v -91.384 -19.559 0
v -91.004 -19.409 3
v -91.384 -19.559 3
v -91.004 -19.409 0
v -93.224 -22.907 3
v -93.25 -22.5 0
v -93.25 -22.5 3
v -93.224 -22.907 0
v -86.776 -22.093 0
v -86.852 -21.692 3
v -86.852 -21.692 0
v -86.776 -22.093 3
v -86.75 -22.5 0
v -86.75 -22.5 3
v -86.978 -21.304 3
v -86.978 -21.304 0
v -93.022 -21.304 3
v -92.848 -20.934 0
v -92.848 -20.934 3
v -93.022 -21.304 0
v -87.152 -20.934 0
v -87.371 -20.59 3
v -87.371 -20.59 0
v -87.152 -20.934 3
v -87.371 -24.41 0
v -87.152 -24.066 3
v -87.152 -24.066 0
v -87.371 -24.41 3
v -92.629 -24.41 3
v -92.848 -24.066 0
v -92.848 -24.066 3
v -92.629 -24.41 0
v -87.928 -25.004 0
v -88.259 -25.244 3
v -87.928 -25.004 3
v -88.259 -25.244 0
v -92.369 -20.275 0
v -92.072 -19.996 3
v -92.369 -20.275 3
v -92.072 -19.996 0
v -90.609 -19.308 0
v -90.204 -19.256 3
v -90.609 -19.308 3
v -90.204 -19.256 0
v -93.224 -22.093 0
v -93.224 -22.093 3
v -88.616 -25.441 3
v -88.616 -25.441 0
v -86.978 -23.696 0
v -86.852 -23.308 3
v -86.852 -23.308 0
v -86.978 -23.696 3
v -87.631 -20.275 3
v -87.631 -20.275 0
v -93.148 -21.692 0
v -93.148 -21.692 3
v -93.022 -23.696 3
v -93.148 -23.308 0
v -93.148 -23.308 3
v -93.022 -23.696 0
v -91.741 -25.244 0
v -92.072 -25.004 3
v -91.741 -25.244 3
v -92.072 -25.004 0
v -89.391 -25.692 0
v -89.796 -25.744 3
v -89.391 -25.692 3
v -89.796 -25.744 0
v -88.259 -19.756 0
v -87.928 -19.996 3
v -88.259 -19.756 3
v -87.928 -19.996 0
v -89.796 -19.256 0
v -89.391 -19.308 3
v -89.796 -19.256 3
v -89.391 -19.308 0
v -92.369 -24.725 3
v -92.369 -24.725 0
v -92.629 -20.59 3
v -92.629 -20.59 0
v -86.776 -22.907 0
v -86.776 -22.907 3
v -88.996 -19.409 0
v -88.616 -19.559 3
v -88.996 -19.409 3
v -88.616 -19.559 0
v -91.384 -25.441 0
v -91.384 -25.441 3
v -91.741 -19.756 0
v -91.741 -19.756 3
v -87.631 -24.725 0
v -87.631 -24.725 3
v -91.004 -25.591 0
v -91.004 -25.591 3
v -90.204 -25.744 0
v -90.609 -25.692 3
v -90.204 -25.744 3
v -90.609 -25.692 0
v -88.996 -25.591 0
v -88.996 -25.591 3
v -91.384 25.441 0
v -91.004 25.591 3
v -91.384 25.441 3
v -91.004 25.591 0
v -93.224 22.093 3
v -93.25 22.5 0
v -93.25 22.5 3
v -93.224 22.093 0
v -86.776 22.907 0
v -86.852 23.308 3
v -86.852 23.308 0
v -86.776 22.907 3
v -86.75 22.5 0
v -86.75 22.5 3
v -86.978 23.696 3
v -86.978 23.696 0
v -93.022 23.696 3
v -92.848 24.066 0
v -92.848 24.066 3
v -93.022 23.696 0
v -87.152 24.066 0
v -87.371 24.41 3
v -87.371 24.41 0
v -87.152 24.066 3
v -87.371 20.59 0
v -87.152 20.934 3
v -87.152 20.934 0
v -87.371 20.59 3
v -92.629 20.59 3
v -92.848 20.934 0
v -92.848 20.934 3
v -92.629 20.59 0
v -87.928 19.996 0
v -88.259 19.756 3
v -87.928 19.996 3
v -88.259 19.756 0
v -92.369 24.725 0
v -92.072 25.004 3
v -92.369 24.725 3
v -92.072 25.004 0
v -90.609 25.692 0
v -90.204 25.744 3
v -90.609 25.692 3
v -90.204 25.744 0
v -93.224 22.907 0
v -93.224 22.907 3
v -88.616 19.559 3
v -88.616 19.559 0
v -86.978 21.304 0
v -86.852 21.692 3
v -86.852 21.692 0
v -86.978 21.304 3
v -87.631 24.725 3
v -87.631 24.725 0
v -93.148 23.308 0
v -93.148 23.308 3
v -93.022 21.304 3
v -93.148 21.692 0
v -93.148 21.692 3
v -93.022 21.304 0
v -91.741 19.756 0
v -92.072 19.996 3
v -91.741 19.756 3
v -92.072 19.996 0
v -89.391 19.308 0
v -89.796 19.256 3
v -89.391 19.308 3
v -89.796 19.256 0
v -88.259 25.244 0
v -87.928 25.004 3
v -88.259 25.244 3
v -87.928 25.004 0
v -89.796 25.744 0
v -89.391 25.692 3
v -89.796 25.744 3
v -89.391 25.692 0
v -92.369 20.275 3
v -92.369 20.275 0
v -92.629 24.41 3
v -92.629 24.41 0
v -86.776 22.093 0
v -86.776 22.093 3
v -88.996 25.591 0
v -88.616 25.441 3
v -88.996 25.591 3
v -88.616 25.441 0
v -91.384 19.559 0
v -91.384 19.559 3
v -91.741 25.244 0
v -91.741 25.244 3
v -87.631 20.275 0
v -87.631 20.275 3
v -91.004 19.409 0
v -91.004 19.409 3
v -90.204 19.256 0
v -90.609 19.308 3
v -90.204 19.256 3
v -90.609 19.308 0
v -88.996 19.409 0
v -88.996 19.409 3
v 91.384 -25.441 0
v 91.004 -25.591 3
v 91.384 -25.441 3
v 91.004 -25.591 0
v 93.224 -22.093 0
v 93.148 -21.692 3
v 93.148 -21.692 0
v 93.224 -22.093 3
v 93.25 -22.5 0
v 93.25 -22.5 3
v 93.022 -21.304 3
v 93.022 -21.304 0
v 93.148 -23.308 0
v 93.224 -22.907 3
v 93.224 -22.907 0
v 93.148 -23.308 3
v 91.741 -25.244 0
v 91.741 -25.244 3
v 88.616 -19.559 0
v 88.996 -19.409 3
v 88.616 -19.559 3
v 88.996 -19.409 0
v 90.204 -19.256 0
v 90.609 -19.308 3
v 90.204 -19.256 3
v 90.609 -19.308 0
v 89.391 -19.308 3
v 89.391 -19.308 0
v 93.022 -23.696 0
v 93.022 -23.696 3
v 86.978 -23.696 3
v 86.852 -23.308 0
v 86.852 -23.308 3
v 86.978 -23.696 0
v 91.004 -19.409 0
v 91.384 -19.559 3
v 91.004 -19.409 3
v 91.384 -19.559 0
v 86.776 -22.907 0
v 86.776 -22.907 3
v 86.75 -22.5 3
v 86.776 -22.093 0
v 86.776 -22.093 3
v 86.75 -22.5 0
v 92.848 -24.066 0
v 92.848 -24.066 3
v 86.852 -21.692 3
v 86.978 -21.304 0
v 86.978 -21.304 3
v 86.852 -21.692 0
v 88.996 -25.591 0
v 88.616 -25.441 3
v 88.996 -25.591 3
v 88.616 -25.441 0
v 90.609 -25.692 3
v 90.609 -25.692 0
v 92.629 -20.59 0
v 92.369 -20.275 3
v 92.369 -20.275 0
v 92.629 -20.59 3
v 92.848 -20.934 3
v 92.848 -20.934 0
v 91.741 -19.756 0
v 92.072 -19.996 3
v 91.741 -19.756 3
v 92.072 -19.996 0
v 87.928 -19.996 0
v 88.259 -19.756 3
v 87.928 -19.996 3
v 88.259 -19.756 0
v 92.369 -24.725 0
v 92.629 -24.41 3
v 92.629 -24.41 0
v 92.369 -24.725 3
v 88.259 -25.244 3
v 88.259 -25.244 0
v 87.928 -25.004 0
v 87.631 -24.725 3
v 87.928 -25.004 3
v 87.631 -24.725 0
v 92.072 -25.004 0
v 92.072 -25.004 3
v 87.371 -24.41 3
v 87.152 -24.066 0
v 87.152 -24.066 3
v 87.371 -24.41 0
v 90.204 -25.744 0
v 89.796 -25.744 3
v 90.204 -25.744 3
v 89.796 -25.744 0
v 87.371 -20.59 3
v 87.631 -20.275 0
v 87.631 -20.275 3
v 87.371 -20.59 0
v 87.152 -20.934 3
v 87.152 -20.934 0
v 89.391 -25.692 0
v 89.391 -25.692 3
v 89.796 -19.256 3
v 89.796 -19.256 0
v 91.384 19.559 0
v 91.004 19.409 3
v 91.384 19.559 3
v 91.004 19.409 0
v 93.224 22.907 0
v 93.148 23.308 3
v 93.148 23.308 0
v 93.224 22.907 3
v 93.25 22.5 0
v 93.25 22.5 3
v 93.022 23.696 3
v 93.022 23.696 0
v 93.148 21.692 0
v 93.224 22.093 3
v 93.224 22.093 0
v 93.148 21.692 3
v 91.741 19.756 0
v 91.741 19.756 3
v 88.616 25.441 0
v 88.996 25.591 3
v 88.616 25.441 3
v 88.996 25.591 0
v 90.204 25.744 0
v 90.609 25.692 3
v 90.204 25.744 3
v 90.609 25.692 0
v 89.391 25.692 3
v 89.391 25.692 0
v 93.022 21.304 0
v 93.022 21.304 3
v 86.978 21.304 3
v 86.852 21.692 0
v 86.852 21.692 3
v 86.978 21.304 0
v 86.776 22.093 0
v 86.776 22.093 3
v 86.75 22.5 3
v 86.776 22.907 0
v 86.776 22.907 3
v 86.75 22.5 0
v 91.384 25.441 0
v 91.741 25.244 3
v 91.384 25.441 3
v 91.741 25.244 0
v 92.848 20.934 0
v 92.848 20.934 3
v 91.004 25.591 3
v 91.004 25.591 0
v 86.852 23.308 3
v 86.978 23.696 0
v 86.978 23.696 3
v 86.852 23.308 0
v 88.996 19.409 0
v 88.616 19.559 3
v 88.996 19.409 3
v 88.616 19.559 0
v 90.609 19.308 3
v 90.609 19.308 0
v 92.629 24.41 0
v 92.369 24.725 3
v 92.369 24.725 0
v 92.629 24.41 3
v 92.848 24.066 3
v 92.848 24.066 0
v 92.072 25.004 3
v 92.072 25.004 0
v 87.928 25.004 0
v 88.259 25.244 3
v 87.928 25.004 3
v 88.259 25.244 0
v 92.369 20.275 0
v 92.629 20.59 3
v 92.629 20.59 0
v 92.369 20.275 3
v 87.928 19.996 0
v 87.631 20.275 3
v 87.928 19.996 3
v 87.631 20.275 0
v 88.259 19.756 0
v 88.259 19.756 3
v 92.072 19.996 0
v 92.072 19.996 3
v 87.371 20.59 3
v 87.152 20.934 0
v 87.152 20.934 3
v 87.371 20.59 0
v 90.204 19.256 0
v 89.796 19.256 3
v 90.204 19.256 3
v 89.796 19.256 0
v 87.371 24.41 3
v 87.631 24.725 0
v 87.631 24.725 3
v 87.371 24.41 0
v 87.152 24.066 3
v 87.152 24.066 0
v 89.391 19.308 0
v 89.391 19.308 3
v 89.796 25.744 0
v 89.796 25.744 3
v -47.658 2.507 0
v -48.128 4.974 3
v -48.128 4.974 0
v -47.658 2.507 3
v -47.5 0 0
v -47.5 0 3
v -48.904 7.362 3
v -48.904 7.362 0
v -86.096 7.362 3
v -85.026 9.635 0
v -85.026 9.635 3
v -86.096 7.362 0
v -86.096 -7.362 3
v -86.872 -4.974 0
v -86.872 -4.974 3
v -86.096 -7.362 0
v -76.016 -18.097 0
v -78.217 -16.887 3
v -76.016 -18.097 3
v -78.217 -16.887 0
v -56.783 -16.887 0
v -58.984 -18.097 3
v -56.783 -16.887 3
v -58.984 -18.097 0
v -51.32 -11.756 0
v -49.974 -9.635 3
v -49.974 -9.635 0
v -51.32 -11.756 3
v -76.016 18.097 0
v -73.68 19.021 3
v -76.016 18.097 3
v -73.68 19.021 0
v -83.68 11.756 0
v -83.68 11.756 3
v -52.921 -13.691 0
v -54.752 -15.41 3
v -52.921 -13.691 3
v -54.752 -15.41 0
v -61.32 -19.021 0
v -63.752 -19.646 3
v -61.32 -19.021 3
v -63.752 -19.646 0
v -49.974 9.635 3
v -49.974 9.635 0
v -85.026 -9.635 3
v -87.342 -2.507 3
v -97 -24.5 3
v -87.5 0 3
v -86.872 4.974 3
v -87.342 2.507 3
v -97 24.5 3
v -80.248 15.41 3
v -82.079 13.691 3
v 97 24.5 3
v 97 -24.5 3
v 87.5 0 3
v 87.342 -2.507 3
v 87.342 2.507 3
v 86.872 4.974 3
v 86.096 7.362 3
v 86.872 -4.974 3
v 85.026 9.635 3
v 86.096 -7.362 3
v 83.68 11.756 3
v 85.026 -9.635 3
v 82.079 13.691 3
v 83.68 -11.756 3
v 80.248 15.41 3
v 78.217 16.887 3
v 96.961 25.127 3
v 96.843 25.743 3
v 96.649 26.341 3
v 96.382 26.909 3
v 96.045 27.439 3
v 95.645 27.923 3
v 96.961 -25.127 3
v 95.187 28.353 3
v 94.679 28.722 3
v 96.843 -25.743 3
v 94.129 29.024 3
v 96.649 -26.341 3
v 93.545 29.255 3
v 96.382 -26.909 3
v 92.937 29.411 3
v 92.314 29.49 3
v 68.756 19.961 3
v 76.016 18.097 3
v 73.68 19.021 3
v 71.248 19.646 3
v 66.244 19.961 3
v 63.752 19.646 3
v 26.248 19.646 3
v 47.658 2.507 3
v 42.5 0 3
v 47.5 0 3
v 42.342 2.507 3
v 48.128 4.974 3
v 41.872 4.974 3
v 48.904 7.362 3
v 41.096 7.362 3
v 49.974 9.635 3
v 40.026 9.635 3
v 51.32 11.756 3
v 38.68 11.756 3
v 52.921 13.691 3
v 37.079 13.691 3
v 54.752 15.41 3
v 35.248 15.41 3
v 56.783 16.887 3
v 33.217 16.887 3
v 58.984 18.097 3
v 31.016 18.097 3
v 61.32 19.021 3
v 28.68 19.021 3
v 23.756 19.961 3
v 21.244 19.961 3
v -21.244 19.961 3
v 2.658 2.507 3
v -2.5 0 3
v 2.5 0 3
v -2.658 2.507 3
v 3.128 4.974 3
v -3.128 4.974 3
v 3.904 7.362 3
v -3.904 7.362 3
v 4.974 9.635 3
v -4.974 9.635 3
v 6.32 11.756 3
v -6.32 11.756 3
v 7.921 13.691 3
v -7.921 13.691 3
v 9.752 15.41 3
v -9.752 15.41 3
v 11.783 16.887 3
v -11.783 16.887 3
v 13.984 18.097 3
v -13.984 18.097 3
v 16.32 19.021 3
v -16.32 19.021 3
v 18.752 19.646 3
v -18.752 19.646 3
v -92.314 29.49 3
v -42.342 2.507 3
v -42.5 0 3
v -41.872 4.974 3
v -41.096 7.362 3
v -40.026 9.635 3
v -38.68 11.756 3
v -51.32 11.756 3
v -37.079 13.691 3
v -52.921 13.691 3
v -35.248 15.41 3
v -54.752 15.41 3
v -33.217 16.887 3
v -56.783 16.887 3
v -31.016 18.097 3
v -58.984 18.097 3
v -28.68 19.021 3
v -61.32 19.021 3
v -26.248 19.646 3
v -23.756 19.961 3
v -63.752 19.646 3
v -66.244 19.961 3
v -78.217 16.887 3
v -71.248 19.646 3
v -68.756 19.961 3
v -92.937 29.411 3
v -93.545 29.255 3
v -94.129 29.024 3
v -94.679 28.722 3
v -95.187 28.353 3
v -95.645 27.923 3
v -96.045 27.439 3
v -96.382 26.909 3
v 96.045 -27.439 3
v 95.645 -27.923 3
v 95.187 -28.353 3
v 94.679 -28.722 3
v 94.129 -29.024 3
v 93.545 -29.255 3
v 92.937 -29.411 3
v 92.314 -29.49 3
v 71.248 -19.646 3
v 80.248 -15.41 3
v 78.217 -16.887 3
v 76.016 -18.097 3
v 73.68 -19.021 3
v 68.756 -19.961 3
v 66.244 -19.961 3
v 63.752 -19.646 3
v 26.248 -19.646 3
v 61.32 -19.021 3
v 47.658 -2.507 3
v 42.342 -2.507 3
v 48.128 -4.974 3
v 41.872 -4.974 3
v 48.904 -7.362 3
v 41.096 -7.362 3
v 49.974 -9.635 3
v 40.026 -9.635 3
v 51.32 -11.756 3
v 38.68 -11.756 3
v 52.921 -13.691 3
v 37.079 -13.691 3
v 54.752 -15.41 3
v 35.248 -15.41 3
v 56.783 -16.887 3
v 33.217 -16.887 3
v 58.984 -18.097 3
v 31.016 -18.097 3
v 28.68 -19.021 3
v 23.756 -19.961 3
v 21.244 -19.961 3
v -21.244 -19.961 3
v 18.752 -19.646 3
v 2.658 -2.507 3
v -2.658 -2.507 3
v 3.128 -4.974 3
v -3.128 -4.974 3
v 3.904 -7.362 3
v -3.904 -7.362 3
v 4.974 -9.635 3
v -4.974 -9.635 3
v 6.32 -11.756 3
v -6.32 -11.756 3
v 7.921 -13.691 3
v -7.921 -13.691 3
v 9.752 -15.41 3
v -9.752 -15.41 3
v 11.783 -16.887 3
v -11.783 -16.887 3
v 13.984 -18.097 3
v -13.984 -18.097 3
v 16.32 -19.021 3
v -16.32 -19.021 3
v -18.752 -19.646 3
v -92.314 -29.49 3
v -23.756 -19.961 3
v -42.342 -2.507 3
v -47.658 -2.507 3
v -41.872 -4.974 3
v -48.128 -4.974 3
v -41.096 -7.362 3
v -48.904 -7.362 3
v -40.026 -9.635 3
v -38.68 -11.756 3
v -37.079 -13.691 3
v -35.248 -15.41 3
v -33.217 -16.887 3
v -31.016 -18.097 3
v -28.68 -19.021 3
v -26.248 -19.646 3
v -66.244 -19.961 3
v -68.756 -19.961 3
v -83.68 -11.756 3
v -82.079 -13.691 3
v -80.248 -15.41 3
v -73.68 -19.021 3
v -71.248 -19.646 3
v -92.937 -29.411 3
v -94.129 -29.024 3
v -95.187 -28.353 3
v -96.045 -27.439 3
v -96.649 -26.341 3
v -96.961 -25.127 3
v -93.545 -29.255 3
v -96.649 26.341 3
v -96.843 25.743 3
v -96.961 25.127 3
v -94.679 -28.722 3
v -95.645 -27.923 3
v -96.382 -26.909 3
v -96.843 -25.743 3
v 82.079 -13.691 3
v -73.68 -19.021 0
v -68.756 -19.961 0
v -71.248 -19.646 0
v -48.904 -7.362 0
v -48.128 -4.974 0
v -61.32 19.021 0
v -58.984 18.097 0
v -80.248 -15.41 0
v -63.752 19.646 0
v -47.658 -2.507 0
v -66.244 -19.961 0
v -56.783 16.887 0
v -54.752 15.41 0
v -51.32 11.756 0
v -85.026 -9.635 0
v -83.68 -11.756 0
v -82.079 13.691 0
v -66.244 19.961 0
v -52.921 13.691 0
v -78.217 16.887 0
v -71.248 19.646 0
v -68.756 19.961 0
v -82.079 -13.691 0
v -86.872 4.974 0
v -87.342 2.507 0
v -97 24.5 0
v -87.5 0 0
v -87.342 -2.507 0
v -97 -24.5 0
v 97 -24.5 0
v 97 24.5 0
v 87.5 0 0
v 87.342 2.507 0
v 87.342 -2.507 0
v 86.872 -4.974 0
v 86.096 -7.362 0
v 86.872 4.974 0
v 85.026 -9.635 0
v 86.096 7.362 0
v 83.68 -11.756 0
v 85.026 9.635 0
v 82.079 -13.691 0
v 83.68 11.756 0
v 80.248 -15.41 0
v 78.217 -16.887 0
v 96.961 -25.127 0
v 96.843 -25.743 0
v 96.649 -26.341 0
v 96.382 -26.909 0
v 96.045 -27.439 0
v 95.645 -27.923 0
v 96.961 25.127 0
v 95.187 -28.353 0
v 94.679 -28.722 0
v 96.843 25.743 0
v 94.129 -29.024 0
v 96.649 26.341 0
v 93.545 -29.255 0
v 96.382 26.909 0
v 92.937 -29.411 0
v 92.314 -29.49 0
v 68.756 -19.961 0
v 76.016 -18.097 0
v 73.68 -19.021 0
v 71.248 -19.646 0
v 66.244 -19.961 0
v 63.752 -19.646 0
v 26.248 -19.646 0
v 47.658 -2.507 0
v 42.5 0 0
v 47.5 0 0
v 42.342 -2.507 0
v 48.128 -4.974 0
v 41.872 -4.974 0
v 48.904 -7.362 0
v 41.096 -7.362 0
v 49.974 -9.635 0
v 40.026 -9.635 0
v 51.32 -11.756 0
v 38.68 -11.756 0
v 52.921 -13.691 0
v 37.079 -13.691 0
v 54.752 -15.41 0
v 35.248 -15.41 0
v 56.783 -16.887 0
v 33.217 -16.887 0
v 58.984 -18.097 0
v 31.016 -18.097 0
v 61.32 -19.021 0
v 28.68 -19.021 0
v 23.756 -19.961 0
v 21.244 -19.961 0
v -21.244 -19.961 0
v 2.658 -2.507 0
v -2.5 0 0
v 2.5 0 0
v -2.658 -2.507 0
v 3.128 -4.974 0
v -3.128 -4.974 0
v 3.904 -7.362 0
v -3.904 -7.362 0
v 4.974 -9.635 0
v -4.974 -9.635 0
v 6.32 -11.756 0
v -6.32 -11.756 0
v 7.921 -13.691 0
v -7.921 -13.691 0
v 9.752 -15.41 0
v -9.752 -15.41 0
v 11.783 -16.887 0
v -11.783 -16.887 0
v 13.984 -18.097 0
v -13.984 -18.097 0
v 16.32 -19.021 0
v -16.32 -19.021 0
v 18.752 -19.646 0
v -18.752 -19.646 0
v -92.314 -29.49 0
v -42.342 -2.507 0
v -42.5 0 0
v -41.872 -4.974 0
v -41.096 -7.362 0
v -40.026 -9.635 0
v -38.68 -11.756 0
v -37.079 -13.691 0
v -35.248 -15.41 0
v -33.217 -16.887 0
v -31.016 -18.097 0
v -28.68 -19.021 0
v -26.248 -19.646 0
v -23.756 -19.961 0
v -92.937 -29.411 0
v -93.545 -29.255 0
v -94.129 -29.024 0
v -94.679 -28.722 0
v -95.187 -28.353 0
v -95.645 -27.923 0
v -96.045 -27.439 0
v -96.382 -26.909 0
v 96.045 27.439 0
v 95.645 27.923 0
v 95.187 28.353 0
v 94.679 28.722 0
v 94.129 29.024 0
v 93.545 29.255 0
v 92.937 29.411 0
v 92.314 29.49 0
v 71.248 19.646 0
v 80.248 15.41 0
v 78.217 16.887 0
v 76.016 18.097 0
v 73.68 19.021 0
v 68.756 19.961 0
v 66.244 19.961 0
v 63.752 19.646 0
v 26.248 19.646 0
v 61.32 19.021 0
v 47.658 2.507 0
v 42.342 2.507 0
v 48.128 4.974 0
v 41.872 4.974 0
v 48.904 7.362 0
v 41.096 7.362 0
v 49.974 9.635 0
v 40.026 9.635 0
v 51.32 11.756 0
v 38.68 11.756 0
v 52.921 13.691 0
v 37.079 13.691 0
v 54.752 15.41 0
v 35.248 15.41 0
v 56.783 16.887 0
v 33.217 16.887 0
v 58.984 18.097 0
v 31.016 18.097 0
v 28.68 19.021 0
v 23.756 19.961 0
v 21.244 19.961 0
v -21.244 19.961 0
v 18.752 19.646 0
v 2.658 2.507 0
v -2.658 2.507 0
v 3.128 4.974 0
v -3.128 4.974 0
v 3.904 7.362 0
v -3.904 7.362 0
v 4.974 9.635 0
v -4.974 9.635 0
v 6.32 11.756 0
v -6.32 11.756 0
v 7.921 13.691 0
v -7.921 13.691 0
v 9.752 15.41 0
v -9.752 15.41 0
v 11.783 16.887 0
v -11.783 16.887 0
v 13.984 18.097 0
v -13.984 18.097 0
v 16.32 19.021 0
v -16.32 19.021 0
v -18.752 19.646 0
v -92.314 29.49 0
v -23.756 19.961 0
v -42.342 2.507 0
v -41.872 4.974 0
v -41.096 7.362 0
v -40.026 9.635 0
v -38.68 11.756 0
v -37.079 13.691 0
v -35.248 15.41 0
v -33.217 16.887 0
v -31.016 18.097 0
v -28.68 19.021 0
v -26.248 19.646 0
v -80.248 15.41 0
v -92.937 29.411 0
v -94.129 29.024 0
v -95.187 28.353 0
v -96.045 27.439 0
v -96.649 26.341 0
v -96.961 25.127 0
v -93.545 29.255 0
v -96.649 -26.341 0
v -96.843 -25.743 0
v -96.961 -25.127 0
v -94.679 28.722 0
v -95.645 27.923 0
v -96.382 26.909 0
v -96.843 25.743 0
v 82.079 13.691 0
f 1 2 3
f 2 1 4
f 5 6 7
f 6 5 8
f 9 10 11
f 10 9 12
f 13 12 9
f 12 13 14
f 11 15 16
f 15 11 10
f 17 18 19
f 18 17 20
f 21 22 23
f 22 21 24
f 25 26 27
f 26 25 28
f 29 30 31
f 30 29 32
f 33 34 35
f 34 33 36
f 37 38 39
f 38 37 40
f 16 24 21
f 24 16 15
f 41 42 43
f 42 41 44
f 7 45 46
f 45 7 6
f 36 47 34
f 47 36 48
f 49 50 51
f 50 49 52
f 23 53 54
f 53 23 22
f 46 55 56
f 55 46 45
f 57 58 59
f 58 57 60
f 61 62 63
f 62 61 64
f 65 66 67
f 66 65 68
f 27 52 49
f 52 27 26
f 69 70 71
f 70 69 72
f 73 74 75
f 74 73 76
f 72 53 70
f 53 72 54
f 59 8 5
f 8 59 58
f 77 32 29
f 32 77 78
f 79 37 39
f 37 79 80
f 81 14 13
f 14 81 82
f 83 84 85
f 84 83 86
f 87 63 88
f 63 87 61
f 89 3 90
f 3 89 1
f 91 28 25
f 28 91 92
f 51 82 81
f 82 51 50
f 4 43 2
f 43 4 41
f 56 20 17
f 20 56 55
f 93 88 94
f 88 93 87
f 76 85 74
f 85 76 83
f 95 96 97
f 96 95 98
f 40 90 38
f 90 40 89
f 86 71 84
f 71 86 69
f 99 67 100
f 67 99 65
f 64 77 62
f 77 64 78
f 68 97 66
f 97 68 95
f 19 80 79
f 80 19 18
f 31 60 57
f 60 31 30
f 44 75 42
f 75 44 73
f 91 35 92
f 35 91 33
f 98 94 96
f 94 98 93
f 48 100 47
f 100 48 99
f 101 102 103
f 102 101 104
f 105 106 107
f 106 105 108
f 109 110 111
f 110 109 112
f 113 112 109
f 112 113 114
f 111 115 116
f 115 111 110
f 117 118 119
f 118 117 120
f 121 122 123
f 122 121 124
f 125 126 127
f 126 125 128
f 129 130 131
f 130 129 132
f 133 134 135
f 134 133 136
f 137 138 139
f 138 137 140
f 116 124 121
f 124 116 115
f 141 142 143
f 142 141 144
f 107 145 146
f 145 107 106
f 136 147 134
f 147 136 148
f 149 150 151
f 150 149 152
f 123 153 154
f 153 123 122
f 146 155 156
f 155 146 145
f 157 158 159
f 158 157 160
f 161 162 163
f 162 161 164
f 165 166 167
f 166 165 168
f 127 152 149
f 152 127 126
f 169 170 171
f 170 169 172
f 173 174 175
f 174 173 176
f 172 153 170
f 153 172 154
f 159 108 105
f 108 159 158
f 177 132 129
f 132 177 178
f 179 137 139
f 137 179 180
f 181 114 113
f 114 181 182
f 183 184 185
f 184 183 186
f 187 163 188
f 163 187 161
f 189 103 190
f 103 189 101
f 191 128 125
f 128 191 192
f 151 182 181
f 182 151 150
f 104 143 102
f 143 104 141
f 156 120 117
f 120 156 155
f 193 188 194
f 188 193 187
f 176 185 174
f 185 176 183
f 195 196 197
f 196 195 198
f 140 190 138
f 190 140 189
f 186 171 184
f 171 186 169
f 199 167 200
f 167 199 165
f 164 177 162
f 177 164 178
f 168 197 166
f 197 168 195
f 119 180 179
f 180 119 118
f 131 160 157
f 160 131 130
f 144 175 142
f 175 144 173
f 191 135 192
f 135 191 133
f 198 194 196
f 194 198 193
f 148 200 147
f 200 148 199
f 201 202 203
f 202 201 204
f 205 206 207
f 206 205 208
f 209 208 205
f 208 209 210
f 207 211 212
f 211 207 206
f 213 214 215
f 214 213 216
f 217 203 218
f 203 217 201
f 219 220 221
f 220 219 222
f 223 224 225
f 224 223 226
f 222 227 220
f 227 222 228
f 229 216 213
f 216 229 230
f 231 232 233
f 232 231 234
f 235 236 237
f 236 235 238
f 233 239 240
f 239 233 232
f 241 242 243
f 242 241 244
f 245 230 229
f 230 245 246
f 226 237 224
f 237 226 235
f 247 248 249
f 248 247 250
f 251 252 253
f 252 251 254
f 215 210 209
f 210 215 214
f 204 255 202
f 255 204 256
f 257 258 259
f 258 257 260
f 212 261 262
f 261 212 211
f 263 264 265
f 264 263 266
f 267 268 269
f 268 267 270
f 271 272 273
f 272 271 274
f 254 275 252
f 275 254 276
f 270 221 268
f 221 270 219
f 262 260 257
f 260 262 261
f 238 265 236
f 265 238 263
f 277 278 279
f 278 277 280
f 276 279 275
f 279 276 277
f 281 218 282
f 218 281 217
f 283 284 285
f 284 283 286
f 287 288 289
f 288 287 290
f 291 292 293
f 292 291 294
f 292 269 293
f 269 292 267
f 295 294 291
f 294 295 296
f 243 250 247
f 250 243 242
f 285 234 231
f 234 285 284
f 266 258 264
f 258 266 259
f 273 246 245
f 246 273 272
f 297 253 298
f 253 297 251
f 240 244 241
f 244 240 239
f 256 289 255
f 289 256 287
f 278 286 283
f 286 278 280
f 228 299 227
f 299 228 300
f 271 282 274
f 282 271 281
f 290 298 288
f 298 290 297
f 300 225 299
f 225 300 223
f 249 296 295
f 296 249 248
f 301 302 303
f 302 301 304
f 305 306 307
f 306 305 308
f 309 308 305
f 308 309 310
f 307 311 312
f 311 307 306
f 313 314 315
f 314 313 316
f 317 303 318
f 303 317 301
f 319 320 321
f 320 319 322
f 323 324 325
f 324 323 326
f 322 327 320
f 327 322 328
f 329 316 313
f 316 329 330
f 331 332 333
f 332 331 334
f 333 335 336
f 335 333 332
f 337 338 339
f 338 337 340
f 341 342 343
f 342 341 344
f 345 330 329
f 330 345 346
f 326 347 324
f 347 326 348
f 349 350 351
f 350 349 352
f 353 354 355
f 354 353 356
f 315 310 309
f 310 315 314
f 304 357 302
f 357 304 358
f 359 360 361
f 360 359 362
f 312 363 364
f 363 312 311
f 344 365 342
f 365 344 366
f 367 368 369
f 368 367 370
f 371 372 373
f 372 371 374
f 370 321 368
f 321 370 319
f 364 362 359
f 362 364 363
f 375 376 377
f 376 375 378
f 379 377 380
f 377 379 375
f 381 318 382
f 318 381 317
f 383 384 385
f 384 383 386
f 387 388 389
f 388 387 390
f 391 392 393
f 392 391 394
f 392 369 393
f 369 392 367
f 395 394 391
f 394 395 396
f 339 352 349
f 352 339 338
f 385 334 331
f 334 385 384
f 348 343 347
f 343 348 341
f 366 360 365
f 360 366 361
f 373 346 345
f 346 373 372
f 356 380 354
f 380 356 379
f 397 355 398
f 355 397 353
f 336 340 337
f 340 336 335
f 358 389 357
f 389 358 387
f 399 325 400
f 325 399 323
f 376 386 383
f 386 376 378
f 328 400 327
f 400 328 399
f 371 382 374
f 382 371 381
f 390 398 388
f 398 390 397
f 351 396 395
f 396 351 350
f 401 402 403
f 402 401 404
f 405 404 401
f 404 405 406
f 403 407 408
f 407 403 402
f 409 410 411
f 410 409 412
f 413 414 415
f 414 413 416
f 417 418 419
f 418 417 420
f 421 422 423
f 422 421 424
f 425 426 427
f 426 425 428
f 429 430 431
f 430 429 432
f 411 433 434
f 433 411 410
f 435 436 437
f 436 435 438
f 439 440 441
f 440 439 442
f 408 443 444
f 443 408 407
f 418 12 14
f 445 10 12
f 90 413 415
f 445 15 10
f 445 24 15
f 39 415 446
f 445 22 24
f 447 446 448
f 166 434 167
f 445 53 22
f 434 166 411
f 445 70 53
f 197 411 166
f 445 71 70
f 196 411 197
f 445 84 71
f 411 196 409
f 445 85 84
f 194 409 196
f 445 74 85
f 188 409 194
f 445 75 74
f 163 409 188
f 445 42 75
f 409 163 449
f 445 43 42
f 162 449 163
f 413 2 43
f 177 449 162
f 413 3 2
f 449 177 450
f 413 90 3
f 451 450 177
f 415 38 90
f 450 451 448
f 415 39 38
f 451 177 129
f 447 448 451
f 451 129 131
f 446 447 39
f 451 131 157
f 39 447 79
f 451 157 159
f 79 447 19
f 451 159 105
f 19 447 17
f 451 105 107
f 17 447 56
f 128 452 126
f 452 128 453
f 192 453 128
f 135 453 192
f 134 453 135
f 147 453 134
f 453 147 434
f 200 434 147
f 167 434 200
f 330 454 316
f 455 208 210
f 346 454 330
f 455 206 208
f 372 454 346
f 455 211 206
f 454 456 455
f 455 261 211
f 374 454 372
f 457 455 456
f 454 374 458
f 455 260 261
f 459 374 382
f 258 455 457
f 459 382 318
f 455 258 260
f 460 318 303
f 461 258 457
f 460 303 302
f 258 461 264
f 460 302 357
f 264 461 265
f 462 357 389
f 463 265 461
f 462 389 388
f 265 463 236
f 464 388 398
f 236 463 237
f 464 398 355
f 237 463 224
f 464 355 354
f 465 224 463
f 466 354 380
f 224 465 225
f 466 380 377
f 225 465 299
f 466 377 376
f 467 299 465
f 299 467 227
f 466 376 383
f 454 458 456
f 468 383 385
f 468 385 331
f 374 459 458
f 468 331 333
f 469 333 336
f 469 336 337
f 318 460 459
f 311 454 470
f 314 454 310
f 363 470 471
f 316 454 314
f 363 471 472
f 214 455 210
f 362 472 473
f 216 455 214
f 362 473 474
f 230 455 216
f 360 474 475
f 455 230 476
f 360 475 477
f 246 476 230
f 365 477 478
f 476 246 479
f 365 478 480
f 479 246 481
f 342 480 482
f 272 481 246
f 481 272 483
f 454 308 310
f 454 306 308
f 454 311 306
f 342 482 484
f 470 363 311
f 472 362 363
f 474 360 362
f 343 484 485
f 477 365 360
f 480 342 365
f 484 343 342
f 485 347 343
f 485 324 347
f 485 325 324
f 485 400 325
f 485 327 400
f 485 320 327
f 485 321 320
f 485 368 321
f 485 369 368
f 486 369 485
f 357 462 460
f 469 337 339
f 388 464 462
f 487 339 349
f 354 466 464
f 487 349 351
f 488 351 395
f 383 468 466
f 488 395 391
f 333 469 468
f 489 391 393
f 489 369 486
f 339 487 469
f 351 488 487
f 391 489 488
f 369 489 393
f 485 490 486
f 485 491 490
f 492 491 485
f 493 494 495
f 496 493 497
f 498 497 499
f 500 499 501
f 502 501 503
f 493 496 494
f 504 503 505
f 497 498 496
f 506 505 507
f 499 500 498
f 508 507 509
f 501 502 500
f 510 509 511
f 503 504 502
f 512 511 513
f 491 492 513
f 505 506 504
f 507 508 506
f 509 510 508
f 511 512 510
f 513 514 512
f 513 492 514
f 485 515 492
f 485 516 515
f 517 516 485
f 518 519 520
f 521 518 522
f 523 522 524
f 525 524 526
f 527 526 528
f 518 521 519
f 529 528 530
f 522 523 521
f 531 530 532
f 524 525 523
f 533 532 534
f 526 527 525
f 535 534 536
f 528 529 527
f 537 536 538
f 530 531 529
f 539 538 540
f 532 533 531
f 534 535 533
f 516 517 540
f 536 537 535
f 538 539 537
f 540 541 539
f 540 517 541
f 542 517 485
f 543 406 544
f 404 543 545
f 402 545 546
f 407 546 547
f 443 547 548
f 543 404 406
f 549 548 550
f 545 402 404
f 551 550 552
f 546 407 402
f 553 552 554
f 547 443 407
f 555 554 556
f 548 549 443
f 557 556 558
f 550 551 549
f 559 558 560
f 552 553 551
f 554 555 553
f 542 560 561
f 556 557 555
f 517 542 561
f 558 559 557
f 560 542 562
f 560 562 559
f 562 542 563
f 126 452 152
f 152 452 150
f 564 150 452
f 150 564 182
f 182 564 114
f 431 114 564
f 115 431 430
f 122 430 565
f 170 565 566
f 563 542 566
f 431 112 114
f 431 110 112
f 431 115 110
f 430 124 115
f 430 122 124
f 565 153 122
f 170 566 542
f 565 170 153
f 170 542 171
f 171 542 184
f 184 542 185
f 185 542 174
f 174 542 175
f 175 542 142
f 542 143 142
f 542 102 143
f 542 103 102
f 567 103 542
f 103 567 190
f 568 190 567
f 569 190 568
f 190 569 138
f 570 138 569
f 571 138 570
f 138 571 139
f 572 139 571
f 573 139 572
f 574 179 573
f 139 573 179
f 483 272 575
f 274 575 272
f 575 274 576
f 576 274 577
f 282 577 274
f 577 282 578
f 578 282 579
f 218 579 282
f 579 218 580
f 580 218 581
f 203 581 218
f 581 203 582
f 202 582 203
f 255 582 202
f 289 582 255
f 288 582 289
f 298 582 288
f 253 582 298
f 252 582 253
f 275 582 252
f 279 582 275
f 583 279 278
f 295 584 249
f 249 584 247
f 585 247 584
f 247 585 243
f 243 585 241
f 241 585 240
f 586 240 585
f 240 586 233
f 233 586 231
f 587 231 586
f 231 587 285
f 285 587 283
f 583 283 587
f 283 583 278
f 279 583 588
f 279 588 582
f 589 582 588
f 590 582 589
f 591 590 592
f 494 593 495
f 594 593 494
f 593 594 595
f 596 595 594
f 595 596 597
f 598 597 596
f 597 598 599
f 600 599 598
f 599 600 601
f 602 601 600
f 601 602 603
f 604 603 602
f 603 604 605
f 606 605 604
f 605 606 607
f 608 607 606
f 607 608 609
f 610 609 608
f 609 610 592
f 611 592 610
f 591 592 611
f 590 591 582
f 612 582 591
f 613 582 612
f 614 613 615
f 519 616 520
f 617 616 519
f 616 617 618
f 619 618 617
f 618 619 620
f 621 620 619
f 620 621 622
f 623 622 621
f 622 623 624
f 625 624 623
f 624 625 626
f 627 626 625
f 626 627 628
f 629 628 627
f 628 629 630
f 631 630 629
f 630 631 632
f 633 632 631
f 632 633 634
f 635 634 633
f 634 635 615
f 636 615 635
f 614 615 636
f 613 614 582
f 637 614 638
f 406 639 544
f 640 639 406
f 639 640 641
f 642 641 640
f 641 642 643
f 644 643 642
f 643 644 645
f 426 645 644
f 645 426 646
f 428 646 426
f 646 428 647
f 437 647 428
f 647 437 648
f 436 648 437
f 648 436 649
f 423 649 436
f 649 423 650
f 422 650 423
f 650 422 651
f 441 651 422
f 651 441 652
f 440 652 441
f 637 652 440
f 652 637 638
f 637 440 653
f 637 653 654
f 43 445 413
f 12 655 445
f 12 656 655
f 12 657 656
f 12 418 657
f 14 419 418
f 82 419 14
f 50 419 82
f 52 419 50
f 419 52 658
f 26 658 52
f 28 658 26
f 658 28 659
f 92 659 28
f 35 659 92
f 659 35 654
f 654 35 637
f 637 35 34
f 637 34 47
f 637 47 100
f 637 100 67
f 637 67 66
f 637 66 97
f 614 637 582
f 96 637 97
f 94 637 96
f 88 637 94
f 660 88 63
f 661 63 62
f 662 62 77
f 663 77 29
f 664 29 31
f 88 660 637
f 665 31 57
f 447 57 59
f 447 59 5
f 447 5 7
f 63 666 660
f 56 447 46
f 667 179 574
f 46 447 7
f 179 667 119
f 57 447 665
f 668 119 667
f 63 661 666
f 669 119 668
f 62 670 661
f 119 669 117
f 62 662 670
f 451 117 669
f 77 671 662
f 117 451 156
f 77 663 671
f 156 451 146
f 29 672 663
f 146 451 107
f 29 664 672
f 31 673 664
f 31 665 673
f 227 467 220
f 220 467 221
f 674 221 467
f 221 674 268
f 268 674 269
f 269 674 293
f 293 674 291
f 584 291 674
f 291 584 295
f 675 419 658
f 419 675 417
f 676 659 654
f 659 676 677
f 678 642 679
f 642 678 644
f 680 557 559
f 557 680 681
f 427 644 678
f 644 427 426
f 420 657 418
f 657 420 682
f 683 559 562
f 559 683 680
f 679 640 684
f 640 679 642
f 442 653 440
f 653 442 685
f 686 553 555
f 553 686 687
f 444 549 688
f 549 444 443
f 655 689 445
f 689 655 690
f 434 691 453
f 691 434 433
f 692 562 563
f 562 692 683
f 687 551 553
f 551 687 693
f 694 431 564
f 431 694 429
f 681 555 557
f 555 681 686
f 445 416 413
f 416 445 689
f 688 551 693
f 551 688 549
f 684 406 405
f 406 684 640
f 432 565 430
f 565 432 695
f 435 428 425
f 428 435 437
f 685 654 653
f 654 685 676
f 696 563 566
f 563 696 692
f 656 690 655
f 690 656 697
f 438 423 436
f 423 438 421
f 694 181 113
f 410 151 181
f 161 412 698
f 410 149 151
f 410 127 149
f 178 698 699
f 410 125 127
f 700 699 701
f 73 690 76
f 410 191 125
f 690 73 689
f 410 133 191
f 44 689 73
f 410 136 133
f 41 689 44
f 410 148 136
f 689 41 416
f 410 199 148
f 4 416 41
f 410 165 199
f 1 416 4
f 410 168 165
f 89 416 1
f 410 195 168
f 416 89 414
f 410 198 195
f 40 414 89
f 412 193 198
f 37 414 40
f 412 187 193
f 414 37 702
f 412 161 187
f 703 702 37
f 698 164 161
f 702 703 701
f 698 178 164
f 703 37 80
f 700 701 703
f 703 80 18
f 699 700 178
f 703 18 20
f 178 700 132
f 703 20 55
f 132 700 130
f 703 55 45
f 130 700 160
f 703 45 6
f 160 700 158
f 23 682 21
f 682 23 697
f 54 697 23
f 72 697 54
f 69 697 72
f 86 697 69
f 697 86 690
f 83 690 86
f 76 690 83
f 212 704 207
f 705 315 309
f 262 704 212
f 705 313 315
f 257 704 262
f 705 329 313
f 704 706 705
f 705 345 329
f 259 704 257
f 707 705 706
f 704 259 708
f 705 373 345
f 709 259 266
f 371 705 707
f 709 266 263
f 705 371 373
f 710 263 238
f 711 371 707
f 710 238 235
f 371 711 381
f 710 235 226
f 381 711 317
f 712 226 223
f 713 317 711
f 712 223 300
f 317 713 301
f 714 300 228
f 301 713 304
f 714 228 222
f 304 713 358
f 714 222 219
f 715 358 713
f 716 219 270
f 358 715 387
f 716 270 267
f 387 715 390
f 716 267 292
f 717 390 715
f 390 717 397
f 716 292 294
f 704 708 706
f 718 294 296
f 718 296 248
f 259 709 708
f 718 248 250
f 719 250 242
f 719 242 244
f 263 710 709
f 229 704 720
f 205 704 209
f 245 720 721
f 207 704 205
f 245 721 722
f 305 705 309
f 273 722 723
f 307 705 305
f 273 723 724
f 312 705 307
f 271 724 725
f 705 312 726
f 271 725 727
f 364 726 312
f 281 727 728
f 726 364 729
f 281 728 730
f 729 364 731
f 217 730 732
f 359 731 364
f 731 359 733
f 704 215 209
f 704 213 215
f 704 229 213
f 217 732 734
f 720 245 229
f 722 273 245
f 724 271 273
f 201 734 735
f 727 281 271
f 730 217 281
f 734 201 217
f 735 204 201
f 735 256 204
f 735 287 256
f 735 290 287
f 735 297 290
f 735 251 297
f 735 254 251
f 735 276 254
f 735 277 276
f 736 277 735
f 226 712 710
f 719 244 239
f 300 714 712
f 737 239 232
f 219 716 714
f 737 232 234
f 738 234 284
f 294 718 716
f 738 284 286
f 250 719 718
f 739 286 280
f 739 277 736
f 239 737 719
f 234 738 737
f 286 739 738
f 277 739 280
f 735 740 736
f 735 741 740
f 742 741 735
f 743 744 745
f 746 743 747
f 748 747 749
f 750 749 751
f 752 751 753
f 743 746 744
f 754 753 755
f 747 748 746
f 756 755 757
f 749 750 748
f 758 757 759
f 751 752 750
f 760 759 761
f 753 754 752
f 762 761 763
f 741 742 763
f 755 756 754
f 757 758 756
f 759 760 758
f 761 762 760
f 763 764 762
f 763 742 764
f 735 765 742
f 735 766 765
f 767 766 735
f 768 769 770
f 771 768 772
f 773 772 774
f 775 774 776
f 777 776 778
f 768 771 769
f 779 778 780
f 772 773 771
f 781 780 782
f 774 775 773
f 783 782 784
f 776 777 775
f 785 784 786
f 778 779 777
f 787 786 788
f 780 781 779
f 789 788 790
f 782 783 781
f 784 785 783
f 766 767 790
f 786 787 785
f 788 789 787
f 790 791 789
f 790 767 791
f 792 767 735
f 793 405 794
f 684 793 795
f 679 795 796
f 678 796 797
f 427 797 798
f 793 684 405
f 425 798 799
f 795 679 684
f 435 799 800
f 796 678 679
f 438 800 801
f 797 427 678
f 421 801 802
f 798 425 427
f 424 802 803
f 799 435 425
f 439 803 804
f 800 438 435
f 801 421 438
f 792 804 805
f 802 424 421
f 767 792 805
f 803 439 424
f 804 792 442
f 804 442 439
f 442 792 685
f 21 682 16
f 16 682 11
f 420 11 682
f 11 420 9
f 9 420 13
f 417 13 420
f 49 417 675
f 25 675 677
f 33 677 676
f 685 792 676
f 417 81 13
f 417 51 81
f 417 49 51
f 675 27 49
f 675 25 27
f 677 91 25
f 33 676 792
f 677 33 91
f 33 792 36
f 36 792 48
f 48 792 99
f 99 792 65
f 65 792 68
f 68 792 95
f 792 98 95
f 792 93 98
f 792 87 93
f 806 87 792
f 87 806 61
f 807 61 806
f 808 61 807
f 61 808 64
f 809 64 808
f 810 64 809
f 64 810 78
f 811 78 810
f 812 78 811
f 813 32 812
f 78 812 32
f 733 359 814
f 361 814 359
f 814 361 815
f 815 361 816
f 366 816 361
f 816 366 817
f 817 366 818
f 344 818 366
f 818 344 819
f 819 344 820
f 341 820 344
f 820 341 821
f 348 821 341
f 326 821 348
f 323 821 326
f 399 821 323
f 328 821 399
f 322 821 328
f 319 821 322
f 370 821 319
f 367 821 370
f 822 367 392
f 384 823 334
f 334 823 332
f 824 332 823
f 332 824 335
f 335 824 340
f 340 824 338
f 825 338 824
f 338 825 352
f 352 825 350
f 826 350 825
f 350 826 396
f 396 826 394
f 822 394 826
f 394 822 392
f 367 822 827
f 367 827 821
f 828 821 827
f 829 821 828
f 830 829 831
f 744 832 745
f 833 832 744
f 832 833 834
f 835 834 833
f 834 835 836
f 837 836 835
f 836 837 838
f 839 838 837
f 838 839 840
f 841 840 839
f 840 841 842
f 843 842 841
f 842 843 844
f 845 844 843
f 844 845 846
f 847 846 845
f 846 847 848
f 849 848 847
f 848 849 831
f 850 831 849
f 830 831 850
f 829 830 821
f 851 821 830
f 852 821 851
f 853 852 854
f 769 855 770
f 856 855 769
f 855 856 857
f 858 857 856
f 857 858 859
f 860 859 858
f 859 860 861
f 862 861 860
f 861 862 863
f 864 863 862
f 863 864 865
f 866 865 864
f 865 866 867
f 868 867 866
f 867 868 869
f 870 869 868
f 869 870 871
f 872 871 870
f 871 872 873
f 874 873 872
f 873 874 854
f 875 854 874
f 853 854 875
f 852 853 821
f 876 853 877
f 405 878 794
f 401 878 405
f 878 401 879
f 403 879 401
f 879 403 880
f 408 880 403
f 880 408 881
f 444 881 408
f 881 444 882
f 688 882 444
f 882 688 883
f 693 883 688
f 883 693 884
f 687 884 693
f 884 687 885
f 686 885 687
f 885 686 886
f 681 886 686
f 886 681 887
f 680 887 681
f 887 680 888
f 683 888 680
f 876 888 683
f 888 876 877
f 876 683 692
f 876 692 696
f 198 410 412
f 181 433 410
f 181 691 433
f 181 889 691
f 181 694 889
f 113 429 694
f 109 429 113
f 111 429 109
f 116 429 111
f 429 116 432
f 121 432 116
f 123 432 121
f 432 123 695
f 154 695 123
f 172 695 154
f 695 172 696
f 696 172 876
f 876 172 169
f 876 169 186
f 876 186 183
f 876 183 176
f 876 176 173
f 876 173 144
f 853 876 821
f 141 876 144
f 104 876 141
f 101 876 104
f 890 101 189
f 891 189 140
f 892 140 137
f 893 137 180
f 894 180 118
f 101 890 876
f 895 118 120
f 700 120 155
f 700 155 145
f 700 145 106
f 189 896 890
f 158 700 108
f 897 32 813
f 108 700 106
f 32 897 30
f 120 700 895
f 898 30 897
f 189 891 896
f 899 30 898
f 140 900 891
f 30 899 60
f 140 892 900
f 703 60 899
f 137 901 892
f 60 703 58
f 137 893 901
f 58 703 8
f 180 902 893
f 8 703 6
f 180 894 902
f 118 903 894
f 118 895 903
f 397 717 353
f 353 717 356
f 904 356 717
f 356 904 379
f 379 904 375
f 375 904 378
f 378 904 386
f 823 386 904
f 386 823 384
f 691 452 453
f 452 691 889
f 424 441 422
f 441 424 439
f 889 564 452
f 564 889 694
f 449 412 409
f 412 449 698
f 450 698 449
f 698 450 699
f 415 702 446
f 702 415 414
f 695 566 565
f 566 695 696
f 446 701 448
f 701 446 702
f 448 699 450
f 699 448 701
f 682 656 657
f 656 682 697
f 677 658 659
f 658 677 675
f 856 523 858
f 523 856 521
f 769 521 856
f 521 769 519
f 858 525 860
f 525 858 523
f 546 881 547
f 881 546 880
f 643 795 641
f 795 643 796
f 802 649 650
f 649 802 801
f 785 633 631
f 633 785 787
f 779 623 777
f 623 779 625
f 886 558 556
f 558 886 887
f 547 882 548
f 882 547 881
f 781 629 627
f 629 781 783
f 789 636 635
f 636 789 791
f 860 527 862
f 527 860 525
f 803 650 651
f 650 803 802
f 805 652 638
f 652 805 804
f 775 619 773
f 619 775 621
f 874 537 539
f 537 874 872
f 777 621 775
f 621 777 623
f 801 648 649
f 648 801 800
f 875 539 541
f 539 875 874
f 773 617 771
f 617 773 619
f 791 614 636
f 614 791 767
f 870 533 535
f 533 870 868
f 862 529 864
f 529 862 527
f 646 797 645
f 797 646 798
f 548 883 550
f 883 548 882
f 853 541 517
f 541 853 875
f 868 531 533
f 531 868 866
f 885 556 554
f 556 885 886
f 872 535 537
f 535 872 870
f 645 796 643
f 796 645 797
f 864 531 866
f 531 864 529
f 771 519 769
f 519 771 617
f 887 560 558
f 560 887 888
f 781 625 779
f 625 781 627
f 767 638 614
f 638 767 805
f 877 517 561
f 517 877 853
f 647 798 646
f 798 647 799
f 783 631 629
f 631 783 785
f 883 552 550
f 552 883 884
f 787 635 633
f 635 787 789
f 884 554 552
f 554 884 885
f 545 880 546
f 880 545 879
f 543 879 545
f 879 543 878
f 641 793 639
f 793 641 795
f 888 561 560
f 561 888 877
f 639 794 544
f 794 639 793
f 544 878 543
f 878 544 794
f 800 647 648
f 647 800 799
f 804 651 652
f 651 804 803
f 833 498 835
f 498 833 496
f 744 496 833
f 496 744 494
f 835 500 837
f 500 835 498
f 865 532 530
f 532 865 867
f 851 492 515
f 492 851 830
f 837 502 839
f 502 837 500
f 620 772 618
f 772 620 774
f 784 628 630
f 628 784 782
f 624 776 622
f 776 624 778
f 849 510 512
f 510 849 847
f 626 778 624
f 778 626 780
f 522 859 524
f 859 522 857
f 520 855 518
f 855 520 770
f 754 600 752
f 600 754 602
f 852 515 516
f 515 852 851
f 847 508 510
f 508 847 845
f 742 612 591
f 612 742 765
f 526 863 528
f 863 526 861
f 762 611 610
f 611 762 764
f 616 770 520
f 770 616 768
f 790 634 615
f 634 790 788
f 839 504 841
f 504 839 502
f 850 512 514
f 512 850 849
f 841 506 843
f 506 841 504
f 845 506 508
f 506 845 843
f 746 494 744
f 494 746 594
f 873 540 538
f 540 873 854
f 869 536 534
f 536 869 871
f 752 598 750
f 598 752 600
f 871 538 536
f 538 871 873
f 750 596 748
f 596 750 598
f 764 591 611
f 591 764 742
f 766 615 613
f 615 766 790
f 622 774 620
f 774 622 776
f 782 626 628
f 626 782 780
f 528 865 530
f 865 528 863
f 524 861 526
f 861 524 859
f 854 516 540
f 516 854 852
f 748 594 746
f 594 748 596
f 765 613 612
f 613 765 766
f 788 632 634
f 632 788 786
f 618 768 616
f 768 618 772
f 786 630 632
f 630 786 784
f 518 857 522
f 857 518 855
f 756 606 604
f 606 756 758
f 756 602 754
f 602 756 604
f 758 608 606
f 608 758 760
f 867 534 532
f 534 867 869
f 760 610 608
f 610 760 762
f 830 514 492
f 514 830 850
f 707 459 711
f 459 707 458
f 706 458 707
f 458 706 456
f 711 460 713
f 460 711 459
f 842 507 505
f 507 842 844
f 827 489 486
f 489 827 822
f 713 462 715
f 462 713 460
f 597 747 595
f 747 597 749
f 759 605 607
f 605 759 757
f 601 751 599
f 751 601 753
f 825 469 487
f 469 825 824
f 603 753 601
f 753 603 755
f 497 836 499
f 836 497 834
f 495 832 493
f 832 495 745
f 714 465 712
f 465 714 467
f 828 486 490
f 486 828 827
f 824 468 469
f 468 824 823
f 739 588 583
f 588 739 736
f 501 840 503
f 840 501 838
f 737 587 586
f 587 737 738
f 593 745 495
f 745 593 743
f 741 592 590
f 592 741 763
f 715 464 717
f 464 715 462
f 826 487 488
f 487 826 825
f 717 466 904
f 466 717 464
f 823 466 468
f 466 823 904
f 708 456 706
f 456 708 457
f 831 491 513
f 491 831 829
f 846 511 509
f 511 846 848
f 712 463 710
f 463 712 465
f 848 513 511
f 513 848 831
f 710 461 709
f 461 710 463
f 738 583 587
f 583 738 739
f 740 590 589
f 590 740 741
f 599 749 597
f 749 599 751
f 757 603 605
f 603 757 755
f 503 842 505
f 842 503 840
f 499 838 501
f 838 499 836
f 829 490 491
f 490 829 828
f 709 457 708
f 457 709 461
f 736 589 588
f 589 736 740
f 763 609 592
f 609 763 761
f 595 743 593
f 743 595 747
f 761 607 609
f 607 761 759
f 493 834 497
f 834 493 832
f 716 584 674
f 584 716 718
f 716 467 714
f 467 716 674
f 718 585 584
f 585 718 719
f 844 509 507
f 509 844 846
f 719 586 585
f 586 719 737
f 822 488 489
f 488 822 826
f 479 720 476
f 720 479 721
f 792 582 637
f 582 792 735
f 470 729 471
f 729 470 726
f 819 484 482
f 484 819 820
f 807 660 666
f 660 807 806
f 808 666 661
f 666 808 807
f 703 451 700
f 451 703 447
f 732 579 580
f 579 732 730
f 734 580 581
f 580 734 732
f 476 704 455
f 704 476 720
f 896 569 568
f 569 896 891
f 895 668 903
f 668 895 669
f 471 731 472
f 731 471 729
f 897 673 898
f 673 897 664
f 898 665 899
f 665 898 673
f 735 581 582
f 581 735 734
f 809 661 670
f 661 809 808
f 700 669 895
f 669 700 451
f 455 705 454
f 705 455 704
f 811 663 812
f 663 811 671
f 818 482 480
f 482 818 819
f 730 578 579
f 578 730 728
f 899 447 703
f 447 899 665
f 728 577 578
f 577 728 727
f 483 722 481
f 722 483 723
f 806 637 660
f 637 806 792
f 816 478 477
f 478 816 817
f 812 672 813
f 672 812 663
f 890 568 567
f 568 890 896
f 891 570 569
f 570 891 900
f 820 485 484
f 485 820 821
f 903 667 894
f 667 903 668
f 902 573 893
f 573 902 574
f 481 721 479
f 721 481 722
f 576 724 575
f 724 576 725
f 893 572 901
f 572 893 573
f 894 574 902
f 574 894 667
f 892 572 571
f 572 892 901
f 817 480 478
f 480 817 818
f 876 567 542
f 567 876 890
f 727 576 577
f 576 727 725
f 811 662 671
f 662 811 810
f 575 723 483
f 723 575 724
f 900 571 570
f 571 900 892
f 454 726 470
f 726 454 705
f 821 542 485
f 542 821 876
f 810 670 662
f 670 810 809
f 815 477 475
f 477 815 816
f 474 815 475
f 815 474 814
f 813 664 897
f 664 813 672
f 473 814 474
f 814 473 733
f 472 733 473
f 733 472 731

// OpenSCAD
$fn = 50;

difference() {
	union() {
		hull() {
			translate(v = [-92.0, 24.5, 0]) {
				cylinder(h = 3, r = 5);
			}
			translate(v = [92.0, 24.5, 0]) {
				cylinder(h = 3, r = 5);
			}
			translate(v = [-92.0, -24.5, 0]) {
				cylinder(h = 3, r = 5);
			}
			translate(v = [92.0, -24.5, 0]) {
				cylinder(h = 3, r = 5);
			}
		}
	}
	union() {
		translate(v = [-90.0, -22.5, -100.0]) {
			cylinder(h = 200, r = 3.25);
		}
		translate(v = [-90.0, 22.5, -100.0]) {
			cylinder(h = 200, r = 3.25);
		}
		translate(v = [90.0, -22.5, -100.0]) {
			cylinder(h = 200, r = 3.25);
		}
		translate(v = [90.0, 22.5, -100.0]) {
			cylinder(h = 200, r = 3.25);
		}
		translate(v = [-90.0, -22.5, -100.0]) {
			cylinder(h = 200, r = 1.8);
		}
		translate(v = [-90.0, 22.5, -100.0]) {
			cylinder(h = 200, r = 1.8);
		}
		translate(v = [90.0, -22.5, -100.0]) {
			cylinder(h = 200, r = 1.8);
		}
		translate(v = [90.0, 22.5, -100.0]) {
			cylinder(h = 200, r = 1.8);
		}
		translate(v = [-67.5, 0, 0.0]) {
			cylinder(h = 3, r = 20.0);
		}
		translate(v = [-22.5, 0, 0.0]) {
			cylinder(h = 3, r = 20.0);
		}
		translate(v = [22.5, 0, 0.0]) {
			cylinder(h = 3, r = 20.0);
		}
		translate(v = [67.5, 0, 0.0]) {
			cylinder(h = 3, r = 20.0);
		}
	}
}
